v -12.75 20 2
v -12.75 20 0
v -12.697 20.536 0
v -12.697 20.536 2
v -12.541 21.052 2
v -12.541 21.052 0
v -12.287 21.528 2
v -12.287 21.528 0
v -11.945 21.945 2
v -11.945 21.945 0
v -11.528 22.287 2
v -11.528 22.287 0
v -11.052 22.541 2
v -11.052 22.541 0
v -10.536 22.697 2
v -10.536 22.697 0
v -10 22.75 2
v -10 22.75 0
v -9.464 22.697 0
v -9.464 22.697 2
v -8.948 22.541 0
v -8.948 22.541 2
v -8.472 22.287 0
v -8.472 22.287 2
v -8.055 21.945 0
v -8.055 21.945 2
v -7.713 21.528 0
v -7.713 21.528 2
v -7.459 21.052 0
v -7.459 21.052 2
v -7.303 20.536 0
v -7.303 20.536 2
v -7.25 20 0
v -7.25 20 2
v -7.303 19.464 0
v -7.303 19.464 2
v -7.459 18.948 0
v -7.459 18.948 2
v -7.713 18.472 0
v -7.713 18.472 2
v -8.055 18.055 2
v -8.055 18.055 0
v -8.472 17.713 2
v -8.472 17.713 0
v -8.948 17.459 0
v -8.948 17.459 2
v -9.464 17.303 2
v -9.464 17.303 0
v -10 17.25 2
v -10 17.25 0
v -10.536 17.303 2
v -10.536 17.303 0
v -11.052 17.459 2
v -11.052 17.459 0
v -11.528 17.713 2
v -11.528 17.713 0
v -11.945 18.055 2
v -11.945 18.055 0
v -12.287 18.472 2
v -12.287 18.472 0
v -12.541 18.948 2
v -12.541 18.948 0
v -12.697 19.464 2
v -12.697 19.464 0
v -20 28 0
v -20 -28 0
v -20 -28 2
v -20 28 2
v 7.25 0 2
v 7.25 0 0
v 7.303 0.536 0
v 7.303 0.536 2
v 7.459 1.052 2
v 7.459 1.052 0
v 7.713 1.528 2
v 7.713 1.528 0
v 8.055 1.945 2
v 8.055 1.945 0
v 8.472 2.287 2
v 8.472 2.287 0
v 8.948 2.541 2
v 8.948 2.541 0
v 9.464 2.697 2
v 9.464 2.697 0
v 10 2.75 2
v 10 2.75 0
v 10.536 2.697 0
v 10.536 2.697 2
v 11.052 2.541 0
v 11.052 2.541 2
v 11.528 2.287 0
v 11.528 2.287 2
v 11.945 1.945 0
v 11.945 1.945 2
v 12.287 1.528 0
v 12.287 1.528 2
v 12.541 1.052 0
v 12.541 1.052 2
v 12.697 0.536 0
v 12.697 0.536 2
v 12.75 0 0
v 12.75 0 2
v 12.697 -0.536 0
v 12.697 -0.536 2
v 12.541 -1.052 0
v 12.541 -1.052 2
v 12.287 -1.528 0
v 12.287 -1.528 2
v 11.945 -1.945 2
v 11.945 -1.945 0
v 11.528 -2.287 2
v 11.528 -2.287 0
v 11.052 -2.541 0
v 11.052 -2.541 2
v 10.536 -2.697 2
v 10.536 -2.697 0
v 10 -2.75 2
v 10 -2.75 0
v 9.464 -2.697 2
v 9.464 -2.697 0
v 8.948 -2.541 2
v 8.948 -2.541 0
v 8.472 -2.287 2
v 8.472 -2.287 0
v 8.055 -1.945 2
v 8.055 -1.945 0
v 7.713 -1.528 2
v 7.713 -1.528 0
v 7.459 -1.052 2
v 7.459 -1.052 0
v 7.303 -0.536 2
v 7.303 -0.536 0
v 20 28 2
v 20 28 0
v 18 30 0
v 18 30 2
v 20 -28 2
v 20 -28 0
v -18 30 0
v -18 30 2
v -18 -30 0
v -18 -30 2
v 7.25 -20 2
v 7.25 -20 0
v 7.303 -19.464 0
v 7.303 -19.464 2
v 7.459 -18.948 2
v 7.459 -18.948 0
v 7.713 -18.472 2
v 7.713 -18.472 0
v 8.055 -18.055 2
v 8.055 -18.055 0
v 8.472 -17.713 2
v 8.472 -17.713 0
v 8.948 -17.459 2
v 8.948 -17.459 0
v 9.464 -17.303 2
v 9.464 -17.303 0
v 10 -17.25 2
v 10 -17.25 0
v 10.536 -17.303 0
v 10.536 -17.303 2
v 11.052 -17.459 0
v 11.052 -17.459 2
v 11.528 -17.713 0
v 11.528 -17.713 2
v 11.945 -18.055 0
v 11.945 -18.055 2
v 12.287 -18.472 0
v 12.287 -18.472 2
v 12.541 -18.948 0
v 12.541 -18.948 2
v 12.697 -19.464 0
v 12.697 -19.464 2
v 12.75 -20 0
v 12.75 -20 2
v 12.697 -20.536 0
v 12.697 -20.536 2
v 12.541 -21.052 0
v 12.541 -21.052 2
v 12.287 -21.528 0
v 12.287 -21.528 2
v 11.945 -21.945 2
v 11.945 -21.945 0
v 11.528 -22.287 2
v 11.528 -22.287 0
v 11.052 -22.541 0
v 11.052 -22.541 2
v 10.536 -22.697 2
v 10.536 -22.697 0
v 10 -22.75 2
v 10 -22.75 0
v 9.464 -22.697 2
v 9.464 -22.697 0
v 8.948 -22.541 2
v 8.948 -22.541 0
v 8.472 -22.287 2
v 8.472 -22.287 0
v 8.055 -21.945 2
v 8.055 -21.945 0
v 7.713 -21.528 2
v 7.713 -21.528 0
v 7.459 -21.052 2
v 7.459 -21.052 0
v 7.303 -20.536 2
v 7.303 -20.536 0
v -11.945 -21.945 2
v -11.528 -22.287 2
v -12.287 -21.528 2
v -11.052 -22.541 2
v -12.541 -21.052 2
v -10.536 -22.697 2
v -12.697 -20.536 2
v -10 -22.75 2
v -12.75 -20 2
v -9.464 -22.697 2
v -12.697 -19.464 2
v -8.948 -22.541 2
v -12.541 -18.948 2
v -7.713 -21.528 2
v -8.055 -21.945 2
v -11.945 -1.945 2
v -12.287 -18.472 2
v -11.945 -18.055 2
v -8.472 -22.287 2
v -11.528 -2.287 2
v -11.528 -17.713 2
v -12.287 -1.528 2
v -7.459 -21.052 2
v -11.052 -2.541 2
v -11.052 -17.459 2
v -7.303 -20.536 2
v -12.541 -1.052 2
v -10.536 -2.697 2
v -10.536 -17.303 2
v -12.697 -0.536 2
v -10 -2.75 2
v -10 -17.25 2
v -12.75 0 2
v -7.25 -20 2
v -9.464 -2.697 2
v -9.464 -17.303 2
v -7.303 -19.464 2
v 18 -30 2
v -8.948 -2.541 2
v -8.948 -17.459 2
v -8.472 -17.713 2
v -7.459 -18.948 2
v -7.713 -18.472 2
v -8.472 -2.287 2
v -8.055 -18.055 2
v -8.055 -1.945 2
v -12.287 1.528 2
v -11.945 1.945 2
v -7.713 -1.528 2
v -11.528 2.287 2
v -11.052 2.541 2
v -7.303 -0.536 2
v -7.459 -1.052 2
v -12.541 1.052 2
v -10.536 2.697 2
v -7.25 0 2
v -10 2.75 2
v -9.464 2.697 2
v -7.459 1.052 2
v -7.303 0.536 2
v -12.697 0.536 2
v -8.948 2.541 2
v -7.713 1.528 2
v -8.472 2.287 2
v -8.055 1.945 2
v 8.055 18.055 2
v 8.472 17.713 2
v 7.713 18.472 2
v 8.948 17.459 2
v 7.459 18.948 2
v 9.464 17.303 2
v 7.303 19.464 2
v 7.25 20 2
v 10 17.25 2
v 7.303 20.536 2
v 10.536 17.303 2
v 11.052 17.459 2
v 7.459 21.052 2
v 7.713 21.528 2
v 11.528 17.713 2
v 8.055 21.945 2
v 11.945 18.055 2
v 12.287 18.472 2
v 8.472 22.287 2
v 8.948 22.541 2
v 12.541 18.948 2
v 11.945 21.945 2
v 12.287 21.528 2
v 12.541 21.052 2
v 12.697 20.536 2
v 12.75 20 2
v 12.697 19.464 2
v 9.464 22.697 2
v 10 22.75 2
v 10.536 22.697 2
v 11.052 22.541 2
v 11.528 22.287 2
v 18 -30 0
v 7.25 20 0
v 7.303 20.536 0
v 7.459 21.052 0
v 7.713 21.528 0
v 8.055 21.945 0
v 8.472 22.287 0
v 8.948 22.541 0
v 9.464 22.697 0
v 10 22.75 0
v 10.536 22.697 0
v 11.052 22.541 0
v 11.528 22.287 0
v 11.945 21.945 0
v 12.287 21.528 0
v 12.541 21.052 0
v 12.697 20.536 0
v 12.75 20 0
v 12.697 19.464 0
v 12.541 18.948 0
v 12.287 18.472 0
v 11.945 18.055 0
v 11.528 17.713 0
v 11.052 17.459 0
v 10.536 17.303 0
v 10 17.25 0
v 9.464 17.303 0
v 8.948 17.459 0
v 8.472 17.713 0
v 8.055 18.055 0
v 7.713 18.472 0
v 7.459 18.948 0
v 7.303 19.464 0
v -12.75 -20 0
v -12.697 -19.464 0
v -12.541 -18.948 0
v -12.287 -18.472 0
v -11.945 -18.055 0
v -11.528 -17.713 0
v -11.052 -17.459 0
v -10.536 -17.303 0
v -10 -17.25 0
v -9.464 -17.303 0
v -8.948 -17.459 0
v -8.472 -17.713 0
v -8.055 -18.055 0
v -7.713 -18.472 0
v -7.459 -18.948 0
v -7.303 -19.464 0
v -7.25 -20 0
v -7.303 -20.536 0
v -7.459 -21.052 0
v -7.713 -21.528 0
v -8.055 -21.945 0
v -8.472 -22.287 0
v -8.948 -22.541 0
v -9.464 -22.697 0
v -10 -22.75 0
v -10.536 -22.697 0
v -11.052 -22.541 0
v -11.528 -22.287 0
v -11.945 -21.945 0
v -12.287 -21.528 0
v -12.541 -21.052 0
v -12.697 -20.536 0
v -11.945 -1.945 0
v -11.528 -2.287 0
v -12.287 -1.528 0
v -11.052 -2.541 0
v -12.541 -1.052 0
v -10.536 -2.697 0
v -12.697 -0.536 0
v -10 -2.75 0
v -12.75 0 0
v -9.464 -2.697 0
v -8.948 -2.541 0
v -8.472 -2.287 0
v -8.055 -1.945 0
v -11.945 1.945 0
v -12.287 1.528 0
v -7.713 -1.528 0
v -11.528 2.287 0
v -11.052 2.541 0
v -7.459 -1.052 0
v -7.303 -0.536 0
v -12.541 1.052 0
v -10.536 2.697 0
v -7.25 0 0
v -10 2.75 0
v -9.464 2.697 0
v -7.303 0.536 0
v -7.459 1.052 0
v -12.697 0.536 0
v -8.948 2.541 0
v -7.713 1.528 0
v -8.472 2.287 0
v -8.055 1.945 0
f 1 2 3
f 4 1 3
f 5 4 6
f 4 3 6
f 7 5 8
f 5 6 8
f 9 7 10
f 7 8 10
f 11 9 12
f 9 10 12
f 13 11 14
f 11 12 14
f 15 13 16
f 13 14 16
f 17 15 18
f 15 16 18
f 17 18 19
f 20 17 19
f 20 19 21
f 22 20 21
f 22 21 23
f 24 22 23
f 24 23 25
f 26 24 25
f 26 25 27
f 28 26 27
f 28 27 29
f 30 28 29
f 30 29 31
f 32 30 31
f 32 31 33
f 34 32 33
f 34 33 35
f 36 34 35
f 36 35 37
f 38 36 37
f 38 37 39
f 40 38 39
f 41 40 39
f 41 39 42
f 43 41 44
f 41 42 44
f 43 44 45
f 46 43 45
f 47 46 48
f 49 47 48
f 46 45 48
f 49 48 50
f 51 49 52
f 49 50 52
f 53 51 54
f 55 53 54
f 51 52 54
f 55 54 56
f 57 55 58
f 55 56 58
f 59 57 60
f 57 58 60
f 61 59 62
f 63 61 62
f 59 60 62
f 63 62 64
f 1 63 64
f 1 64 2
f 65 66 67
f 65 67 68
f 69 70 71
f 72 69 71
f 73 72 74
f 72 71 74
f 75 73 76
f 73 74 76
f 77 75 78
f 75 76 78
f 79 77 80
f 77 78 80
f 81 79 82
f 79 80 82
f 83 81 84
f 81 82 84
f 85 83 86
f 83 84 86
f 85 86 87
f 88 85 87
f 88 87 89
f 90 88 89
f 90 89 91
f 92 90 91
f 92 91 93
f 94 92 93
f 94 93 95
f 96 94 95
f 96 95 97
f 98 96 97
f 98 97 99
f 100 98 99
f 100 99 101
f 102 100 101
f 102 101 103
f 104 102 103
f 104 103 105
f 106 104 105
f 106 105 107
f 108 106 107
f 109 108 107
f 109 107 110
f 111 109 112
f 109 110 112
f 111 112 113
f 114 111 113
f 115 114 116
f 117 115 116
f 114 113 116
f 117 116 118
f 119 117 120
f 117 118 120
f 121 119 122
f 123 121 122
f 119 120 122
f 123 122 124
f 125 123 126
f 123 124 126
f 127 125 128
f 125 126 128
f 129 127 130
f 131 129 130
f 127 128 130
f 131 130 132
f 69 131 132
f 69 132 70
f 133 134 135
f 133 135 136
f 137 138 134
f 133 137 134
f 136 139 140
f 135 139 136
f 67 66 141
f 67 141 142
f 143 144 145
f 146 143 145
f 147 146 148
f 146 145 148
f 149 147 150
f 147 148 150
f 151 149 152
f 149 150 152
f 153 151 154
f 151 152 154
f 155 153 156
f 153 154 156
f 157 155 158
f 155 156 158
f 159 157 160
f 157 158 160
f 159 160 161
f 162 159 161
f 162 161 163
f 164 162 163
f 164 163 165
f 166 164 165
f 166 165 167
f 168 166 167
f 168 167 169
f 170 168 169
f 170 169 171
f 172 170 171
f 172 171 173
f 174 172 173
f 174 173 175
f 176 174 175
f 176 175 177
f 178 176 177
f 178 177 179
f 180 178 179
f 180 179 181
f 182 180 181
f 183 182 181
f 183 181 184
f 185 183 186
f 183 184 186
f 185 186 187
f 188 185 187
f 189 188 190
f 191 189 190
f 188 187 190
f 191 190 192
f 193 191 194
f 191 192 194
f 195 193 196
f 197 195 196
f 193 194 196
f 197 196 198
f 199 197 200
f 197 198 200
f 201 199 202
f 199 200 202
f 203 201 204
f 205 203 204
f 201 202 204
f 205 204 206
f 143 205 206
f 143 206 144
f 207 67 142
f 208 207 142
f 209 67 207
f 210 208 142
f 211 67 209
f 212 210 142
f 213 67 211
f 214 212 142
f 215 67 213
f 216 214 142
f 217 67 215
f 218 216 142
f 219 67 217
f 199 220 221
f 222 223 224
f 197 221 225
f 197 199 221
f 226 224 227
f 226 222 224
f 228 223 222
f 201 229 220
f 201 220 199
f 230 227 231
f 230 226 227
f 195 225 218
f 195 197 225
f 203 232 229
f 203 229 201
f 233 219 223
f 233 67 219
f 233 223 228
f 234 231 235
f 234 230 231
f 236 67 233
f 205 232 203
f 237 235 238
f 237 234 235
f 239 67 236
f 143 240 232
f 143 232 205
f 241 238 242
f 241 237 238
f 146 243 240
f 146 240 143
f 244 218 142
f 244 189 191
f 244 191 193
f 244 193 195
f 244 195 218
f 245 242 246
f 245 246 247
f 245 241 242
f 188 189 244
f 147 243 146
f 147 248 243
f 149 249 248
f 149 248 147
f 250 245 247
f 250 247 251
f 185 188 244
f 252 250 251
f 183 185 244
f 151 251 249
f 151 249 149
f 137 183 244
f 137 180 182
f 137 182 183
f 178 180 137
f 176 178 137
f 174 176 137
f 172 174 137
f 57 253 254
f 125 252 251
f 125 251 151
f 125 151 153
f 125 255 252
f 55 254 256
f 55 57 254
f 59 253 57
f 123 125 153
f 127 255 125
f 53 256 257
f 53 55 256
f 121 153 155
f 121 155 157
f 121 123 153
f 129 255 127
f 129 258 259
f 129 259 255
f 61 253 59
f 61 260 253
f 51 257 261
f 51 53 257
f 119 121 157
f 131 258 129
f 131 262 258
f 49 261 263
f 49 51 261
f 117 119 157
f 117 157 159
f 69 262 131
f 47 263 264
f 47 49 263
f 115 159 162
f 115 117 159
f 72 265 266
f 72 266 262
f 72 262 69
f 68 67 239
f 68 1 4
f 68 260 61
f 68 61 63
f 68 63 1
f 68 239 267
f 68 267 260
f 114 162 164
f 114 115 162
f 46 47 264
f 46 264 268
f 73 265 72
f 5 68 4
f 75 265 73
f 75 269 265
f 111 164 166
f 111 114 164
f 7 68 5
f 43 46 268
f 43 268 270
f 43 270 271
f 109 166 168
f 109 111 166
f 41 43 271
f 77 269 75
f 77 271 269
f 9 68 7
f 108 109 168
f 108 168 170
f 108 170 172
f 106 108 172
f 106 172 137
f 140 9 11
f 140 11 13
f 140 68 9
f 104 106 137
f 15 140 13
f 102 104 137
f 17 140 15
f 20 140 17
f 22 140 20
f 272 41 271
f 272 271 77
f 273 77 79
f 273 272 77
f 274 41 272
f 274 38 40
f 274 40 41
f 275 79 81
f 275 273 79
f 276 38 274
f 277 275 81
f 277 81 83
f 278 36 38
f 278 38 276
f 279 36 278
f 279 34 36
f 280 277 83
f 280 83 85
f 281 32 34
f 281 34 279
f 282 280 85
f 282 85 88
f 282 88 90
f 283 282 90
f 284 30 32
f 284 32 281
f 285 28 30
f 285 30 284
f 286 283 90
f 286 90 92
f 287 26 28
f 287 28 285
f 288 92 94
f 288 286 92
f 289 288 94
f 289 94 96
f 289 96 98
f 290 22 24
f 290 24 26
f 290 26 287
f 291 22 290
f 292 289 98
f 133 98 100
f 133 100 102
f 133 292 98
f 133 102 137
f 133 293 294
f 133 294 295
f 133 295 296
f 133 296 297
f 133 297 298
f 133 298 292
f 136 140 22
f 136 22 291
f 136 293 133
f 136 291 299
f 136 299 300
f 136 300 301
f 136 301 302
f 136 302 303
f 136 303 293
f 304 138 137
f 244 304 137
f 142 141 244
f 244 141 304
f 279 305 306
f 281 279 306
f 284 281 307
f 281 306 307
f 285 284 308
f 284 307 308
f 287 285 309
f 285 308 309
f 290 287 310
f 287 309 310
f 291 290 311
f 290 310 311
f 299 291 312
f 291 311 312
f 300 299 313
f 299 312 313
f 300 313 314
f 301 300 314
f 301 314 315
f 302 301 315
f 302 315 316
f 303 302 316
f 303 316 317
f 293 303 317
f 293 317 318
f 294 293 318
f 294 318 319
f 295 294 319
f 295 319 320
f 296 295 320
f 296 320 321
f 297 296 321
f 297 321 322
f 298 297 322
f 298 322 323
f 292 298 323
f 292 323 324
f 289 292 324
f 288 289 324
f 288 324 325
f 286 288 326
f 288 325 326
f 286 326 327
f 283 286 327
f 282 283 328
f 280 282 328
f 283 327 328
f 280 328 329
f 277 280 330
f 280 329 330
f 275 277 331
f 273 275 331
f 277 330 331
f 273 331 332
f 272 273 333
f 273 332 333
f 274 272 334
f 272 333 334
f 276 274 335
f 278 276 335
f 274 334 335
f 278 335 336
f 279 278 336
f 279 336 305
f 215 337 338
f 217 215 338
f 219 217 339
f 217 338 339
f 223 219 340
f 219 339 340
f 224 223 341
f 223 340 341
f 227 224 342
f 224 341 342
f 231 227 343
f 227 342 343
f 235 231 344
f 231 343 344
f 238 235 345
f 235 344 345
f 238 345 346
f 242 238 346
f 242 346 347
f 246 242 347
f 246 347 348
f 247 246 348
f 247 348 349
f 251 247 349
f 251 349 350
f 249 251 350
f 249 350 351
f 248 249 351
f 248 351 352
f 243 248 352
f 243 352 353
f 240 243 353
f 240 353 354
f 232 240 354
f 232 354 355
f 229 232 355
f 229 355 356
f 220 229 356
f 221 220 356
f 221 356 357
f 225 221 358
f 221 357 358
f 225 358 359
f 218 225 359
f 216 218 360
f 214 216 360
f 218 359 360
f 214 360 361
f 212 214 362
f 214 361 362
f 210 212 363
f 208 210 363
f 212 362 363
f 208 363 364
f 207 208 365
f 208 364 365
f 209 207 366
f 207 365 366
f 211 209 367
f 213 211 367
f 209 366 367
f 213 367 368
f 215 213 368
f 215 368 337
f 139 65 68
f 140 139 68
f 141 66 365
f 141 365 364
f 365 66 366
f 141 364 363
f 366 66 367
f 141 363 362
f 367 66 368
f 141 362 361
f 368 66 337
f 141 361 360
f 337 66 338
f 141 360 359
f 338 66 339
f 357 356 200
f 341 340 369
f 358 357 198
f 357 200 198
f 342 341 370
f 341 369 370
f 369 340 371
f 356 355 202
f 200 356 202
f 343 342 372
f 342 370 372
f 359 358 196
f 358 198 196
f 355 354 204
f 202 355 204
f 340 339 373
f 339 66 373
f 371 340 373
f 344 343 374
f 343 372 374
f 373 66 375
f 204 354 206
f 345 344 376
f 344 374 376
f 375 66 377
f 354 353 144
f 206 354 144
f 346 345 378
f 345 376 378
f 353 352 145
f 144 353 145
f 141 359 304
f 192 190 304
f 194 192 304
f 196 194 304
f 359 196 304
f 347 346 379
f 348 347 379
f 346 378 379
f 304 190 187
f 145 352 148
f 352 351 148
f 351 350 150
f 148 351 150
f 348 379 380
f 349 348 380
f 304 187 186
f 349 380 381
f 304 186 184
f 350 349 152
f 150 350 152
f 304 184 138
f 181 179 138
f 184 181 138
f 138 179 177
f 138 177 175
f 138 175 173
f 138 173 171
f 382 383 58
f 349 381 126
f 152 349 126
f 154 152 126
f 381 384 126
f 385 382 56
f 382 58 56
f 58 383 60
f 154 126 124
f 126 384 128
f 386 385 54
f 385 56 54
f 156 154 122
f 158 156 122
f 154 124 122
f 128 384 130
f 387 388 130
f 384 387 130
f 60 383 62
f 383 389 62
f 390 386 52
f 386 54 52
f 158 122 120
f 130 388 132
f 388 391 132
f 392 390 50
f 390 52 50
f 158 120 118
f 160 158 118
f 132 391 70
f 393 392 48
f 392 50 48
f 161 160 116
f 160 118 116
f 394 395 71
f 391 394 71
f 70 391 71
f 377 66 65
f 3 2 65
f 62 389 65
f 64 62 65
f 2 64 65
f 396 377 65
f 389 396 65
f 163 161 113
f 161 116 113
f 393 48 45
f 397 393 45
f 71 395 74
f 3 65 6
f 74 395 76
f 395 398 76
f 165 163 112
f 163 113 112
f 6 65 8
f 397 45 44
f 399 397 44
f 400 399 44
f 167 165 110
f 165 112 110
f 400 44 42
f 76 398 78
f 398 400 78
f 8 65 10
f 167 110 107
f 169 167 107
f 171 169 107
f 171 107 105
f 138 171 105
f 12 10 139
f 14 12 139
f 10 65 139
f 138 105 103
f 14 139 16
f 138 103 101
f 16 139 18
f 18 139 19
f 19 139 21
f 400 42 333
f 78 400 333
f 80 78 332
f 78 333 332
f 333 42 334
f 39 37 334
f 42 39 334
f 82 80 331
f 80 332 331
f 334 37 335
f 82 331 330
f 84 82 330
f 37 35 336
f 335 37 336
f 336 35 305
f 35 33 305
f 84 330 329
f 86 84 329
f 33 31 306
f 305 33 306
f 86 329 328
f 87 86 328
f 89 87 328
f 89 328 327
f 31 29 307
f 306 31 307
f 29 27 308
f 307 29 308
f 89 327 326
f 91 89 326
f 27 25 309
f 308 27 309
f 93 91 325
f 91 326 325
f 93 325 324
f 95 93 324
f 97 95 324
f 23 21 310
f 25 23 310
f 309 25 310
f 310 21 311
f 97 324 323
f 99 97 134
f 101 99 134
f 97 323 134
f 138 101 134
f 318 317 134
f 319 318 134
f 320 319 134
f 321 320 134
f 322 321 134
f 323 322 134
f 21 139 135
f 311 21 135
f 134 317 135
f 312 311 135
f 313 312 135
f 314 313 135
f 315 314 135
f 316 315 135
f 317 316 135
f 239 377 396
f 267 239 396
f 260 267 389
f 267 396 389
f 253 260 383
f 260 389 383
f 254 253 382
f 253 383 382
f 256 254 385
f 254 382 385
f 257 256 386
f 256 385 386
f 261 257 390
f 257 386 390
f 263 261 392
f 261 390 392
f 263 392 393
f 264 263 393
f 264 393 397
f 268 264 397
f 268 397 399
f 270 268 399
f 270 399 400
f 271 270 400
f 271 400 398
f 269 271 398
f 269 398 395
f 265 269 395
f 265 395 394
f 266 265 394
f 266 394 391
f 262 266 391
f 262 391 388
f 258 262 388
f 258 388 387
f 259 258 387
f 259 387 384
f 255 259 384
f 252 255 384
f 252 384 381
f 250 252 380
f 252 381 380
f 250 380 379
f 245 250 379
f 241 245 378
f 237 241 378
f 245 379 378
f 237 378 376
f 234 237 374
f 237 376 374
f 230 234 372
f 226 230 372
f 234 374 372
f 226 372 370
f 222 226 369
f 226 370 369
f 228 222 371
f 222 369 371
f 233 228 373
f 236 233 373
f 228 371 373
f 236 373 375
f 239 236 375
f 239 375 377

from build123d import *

# Parameters (mm, degrees)
SKETCH_1_W        = 40
SKETCH_1_H        = 60
EXTRUDE_1_DEPTH   = 2
CHAMFER_1_SIZE    = 2
HOLE_WIZARD_M51_D = 5.5


with BuildPart() as part:
    # Эскиз1 → Бобышка-Вытянуть1 (new body)
    with BuildSketch(Plane.XY):
        Rectangle(SKETCH_1_W, SKETCH_1_H)
    extrude(amount=EXTRUDE_1_DEPTH)

    # Фаска1
    chamfer_1_edges = [part.edges().sort_by_distance(p)[0] for p in [
        (20, -30, 1),
        (-20, -30, 1),
        (-20, 30, 1),
        (20, 30, 1),
    ]]
    chamfer(chamfer_1_edges, length=CHAMFER_1_SIZE)

    # Отверстие с зазором M51 (through all)
    with Locations(Plane.XY.offset(2)):
        with Locations((-10, 20), (10, 20), (10, 0), (-10, 0), (-10, -20), (10, -20)):
            Hole(HOLE_WIZARD_M51_D / 2)


solid = part.part
